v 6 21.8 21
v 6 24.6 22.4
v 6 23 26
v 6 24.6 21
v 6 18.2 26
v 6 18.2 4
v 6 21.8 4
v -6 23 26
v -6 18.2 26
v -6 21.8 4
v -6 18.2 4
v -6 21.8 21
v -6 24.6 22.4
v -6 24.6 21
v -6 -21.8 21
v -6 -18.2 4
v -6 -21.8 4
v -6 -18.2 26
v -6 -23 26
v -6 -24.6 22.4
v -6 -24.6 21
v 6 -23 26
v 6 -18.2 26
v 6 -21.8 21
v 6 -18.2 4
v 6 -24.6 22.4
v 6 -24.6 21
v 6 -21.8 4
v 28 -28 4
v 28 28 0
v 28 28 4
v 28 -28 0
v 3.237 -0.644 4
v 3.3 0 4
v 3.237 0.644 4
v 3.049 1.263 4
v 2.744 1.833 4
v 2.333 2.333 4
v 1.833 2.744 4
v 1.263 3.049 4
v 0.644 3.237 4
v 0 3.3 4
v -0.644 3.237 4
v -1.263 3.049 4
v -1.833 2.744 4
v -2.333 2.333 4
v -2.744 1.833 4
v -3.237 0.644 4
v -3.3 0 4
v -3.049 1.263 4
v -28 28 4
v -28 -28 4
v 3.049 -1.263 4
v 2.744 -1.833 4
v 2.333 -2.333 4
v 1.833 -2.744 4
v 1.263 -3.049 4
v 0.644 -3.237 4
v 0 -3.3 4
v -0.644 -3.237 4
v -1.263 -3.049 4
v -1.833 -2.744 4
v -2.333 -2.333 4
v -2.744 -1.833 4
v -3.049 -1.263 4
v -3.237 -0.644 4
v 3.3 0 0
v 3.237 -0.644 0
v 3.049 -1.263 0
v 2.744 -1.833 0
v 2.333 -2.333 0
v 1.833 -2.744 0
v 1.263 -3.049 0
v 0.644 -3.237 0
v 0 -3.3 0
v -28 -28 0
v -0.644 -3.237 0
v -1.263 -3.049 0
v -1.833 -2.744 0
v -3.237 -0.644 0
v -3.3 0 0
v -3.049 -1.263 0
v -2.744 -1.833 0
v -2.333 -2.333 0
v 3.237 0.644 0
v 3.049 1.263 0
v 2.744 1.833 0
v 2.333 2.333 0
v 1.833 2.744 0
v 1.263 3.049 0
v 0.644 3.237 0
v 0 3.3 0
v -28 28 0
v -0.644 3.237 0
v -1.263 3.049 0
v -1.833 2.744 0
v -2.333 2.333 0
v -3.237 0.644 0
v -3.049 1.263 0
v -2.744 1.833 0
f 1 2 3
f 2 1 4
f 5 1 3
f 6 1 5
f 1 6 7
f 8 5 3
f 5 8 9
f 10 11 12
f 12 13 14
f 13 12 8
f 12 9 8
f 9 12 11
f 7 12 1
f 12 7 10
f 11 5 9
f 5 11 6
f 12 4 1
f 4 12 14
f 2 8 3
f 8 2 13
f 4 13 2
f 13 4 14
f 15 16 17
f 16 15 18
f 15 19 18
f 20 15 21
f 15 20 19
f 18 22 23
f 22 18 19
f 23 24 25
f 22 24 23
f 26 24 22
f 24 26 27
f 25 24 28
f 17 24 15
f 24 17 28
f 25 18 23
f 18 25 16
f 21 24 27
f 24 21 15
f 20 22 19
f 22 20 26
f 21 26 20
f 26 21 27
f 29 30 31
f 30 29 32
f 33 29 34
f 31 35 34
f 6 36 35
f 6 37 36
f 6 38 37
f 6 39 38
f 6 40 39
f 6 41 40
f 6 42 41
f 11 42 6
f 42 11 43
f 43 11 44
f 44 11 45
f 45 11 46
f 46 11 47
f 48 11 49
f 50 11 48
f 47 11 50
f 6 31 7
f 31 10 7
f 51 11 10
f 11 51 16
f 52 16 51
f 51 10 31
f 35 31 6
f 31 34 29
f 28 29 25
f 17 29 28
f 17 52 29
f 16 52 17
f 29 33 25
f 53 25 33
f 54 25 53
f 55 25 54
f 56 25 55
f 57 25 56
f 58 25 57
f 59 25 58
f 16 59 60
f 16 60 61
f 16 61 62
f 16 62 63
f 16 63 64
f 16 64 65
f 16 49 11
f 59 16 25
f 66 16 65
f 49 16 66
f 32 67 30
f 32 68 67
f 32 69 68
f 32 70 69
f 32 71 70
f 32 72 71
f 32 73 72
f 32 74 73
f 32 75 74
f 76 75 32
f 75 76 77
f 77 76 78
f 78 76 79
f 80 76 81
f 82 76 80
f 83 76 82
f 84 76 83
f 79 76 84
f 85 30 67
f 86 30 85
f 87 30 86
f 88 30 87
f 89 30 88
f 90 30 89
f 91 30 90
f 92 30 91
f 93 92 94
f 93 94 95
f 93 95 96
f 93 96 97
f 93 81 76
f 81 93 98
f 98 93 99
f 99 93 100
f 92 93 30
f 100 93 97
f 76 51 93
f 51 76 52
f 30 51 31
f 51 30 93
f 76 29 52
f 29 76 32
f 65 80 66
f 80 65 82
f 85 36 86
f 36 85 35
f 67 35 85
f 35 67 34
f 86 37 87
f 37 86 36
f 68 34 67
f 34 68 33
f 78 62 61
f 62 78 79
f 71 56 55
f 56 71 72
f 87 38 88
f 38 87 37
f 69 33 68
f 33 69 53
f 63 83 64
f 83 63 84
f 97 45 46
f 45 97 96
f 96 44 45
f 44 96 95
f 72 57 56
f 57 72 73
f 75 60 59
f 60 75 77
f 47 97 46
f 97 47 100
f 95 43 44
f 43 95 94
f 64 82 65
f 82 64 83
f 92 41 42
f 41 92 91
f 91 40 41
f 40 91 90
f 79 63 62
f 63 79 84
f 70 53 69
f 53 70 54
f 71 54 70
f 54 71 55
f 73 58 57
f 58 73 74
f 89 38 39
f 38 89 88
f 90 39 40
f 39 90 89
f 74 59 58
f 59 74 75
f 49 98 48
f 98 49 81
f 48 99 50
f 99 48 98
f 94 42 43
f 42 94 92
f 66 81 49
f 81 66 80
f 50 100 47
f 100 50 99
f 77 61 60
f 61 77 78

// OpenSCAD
$fn = 32;

// ----------------------------------------------------------------------
// Snap-fit latch: 2 arms, 22 mm tall, 3 mm undercut hooks
// ----------------------------------------------------------------------

// --- parameters (mm) ---
base_d = 56;              // base plate depth
base_h = 4;               // base plate thickness
span = 40;                // distance between opposite arms
arm_t = 3.6;              // arm thickness
arm_d = 12;               // arm width
height = 22;              // free arm length
head_len = 3;             // hook reach
head_h = 5;               // hook height
lead = 1.4;               // lead-in ramp thickness
bore_d = 6.6;             // base fixing bore
top_z = 26;               // height of the arm tips above the base

arms = 2;

difference() {
  union() {
    /* base plate, centred on the arm ring */
    translate([-28, -28, 0]) cube([base_d, base_d, base_h]);
    for (a = [0 : 360 / arms : 359]) rotate([0, 0, a]) {
    /* arm, sunk 0.5 mm into the base */
    translate([-arm_d / 2, span / 2 - arm_t / 2, base_h - 0.5]) cube([arm_d, arm_t, height + 0.5]);
    /* hook: a convex hull of a tall inner block and a thin outer lip
       gives a flat undercut below and a lead-in ramp on top */
    hull() {
      translate([-arm_d / 2, span / 2 + arm_t / 2 - 0.6, top_z - head_h]) cube([arm_d, lead + 0.4, head_h]);
      translate([-arm_d / 2, span / 2 + arm_t / 2 - 0.2, top_z - head_h]) cube([arm_d, head_len, lead]);
    }
    }
  }
  translate([0, 0, -2.5]) cylinder(h = base_h + 5, d = bore_d);
}
